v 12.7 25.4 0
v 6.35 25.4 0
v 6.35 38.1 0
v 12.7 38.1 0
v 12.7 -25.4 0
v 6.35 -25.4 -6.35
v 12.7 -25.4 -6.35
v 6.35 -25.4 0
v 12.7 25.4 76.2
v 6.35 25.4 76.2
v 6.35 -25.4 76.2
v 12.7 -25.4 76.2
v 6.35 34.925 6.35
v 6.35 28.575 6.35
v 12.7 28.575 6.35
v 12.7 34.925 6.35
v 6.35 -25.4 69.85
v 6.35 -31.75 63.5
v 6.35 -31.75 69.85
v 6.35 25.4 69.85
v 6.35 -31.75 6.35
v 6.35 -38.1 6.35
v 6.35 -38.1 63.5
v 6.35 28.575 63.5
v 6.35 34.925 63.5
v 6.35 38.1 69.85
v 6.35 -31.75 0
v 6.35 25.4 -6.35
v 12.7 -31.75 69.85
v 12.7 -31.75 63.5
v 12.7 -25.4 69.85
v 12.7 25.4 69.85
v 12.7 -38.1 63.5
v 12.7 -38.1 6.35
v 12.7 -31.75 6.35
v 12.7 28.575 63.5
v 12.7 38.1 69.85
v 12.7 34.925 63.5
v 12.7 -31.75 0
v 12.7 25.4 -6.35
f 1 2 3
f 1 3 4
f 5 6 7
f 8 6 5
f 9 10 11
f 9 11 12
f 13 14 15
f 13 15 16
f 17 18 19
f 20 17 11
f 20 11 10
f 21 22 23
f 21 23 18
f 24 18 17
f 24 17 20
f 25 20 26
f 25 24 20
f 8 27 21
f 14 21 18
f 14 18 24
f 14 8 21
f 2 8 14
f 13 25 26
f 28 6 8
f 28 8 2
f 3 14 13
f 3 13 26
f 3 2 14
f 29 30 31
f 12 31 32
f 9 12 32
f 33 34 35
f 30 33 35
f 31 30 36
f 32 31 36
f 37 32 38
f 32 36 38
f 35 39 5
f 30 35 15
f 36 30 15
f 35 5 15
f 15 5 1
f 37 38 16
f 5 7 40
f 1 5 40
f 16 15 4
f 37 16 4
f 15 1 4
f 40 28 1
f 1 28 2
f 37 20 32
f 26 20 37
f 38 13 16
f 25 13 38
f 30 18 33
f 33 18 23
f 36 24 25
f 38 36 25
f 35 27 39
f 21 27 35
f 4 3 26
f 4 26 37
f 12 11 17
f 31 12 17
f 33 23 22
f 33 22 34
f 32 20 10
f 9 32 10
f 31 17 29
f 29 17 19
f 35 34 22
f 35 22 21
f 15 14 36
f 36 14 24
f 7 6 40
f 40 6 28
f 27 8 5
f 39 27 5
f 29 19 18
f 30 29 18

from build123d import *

# Parameters (mm, degrees)
SKETCH1_W           = 6.35
SKETCH1_H           = 76.2
BOSS_EXTRUDE1_DEPTH = 76.2
SKETCH2_W           = 6.35
SKETCH2_H           = 50.8
BOSS_EXTRUDE2_DEPTH = 6.35
SKETCH3_W           = 6.35
SKETCH3_H           = 6.35
SKETCH3_H_2         = 12.7
CUT_EXTRUDE1_DEPTH  = 86.430512699
SKETCH4_W           = 57.15
SKETCH4_H           = 6.35
CUT_EXTRUDE2_DEPTH  = 86.430512699


with BuildPart() as part:
    # Sketch1 → Boss-Extrude1 (new body)
    with BuildSketch(Plane.XY):
        with Locations((9.525, 0)):
            Rectangle(SKETCH1_W, SKETCH1_H)
    extrude(amount=BOSS_EXTRUDE1_DEPTH)

    # Sketch2 → Boss-Extrude2 (add)
    with BuildSketch(Plane.ZY.offset(-6.35)):
        with Locations((-3.175, 0)):
            Rectangle(SKETCH2_W, SKETCH2_H)
    extrude(amount=-BOSS_EXTRUDE2_DEPTH)

    # Sketch3 → Cut-Extrude1 (cut, through all)
    with BuildSketch(Plane.ZY.offset(-6.35)):
        Polygon((69.85, -38.1), (76.2, -38.1), (76.2, -25.4), (69.85, -25.4), (69.85, -31.75), (63.5, -31.75), (63.5, -38.1), align=None)
        with Locations((3.175, -34.925)):
            Rectangle(SKETCH3_W, SKETCH3_H)
        with Locations((73.025, 31.75)):
            Rectangle(SKETCH3_W, SKETCH3_H_2)
    extrude(amount=-CUT_EXTRUDE1_DEPTH, mode=Mode.SUBTRACT)

    # Sketch4 → Cut-Extrude2 (cut, through all)
    with BuildSketch(Plane.ZY.offset(-6.35)):
        with Locations((34.925, 31.75)):
            Rectangle(SKETCH4_W, SKETCH4_H)
    extrude(amount=-CUT_EXTRUDE2_DEPTH, mode=Mode.SUBTRACT)


solid = part.part
